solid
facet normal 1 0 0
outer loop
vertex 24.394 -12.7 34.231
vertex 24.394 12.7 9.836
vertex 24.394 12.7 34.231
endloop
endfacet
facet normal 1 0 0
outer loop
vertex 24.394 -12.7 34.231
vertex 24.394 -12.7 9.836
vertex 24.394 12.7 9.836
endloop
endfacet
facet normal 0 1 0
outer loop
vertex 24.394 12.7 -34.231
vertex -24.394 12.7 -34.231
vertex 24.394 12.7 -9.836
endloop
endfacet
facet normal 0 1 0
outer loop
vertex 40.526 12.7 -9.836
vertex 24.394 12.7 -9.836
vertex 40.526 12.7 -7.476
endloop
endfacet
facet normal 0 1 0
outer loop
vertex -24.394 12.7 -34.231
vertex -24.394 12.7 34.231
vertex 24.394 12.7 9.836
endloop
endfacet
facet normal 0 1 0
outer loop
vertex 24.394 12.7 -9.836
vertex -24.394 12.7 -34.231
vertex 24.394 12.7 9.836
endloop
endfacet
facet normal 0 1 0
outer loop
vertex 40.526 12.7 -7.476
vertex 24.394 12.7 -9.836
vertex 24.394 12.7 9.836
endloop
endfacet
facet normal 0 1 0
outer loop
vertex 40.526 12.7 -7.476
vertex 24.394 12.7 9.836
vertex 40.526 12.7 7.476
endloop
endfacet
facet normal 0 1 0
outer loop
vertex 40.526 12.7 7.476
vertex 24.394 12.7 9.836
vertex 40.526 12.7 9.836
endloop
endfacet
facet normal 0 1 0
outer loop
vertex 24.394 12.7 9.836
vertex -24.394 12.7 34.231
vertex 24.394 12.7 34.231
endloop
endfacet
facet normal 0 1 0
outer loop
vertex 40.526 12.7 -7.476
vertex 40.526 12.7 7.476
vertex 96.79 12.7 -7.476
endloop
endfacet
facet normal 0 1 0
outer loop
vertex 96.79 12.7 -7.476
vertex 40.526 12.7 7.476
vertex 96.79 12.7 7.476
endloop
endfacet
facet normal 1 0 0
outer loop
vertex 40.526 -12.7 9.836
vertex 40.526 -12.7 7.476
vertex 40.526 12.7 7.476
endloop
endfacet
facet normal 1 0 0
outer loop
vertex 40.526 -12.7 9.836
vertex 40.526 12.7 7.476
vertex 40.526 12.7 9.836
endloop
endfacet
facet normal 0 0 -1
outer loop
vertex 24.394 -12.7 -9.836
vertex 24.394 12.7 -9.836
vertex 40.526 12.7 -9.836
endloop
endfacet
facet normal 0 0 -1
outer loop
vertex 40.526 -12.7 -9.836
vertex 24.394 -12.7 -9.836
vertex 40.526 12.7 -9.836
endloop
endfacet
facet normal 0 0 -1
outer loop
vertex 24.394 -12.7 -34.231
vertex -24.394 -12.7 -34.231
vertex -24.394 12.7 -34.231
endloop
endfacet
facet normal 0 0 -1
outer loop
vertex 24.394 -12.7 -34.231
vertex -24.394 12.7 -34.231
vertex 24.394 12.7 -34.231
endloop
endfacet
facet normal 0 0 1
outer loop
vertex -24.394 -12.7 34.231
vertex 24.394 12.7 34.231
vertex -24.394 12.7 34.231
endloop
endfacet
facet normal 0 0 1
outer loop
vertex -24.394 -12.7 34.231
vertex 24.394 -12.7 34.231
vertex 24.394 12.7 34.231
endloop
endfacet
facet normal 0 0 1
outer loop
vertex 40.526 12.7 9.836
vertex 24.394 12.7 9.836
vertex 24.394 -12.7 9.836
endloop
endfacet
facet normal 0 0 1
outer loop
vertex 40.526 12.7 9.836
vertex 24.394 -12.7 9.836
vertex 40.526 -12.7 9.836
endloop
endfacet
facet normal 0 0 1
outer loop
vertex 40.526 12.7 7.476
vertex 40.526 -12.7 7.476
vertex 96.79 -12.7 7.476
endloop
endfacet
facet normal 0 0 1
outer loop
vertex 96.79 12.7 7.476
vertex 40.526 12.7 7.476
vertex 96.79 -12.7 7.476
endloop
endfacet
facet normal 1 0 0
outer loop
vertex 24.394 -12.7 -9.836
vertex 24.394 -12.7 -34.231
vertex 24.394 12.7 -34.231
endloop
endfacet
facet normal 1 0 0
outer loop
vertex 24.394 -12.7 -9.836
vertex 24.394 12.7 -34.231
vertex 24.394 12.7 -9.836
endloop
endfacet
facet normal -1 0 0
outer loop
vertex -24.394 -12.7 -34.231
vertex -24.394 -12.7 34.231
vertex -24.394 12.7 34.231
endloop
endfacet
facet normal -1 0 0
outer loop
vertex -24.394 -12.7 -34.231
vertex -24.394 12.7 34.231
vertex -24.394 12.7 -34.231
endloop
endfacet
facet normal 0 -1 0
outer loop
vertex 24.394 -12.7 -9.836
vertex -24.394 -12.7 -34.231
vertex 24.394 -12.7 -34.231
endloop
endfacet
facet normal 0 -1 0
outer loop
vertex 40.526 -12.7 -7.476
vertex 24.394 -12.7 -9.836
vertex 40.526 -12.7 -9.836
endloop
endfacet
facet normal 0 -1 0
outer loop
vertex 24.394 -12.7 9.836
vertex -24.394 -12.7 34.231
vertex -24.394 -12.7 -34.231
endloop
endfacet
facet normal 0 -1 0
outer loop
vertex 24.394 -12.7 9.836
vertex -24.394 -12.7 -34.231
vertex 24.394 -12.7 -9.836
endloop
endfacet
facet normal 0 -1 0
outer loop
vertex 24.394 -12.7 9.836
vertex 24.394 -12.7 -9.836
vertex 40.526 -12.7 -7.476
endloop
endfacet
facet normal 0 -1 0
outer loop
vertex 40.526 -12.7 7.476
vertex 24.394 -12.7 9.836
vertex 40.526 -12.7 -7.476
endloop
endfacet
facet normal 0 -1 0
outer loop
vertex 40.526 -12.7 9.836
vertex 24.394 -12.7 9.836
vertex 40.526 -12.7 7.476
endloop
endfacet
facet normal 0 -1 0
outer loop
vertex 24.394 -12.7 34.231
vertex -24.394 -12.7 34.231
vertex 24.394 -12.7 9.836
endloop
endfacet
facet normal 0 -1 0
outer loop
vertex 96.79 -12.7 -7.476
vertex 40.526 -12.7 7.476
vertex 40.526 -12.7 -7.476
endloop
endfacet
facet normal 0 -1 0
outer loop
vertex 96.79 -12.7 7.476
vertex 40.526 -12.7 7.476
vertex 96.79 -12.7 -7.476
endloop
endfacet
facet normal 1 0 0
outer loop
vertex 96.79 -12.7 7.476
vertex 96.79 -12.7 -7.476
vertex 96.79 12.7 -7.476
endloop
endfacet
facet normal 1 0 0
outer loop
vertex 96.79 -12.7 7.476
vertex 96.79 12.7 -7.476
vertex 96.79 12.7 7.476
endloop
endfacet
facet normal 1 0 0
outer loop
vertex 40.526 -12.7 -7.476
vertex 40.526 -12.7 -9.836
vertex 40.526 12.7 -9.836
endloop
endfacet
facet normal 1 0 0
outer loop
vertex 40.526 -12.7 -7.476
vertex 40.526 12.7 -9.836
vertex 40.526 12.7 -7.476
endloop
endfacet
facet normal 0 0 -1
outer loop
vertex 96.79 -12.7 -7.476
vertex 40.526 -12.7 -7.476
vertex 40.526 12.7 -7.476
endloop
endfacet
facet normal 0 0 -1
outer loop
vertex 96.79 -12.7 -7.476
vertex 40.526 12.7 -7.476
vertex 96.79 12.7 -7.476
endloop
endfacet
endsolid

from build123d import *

# Parameters (mm, degrees)
F0_W     = 24.0008160472
F0_H     = 14.9513203651
F0_W_2   = 16.1316711456
F0_H_2   = 2.3607341573
F0_W_3   = 56.2641583383
F2_DEPTH = 12.7
F4_DEPTH = 25.4


# Not quite as in the source:
# - the program builds the solid bodies; features that only make, move or delete a surface that nothing else refers to are left out


with BuildPart() as f2:
    # F0 (on Front) → F2 (new body, symmetric)
    with BuildSketch(Plane.XZ):
        with Locations((-3.7378184497, 0)):
            Rectangle(F0_W, F0_H)
        Polygon((24.3942607194, 34.2306494713), (-24.3942607194, 34.2306494713), (-24.3942607194, -34.2306494713), (24.3942607194, -34.2306494713), (24.3942607194, -9.8363943398), (8.2625895739, -9.8363943398), (8.2625895739, -7.4756601825), (-15.7382264733, -7.4756601825), (-15.7382264733, 7.4756601825), (8.2625895739, 7.4756601825), (8.2625895739, 9.8363943398), (24.3942607194, 9.8363943398), align=None)
        with Locations((32.4600962922, 0)):
            Rectangle(F0_W_2, F0_H)
        with Locations((16.3284251466, 0)):
            Rectangle(F0_W_2, F0_H)
        with Locations((16.3284251466, 8.6560272612)):
            Rectangle(F0_W_2, F0_H_2)
        with Locations((32.4600962922, 8.6560272612)):
            Rectangle(F0_W_2, F0_H_2)
        with Locations((16.3284251466, -8.6560272612)):
            Rectangle(F0_W_2, F0_H_2)
        with Locations((32.4600962922, -8.6560272612)):
            Rectangle(F0_W_2, F0_H_2)
        with Locations((68.6580110341, 0)):
            Rectangle(F0_W_3, F0_H)
    extrude(amount=F2_DEPTH, both=True)

    # F4 (add): a face of the model
    f4_faces = [f2.faces().sort_by_distance(p)[0] for p in [
        (15.1283797196, 12.7, 0),
    ]]
    extrude(f4_faces, amount=-F4_DEPTH)


solid = f2.part
